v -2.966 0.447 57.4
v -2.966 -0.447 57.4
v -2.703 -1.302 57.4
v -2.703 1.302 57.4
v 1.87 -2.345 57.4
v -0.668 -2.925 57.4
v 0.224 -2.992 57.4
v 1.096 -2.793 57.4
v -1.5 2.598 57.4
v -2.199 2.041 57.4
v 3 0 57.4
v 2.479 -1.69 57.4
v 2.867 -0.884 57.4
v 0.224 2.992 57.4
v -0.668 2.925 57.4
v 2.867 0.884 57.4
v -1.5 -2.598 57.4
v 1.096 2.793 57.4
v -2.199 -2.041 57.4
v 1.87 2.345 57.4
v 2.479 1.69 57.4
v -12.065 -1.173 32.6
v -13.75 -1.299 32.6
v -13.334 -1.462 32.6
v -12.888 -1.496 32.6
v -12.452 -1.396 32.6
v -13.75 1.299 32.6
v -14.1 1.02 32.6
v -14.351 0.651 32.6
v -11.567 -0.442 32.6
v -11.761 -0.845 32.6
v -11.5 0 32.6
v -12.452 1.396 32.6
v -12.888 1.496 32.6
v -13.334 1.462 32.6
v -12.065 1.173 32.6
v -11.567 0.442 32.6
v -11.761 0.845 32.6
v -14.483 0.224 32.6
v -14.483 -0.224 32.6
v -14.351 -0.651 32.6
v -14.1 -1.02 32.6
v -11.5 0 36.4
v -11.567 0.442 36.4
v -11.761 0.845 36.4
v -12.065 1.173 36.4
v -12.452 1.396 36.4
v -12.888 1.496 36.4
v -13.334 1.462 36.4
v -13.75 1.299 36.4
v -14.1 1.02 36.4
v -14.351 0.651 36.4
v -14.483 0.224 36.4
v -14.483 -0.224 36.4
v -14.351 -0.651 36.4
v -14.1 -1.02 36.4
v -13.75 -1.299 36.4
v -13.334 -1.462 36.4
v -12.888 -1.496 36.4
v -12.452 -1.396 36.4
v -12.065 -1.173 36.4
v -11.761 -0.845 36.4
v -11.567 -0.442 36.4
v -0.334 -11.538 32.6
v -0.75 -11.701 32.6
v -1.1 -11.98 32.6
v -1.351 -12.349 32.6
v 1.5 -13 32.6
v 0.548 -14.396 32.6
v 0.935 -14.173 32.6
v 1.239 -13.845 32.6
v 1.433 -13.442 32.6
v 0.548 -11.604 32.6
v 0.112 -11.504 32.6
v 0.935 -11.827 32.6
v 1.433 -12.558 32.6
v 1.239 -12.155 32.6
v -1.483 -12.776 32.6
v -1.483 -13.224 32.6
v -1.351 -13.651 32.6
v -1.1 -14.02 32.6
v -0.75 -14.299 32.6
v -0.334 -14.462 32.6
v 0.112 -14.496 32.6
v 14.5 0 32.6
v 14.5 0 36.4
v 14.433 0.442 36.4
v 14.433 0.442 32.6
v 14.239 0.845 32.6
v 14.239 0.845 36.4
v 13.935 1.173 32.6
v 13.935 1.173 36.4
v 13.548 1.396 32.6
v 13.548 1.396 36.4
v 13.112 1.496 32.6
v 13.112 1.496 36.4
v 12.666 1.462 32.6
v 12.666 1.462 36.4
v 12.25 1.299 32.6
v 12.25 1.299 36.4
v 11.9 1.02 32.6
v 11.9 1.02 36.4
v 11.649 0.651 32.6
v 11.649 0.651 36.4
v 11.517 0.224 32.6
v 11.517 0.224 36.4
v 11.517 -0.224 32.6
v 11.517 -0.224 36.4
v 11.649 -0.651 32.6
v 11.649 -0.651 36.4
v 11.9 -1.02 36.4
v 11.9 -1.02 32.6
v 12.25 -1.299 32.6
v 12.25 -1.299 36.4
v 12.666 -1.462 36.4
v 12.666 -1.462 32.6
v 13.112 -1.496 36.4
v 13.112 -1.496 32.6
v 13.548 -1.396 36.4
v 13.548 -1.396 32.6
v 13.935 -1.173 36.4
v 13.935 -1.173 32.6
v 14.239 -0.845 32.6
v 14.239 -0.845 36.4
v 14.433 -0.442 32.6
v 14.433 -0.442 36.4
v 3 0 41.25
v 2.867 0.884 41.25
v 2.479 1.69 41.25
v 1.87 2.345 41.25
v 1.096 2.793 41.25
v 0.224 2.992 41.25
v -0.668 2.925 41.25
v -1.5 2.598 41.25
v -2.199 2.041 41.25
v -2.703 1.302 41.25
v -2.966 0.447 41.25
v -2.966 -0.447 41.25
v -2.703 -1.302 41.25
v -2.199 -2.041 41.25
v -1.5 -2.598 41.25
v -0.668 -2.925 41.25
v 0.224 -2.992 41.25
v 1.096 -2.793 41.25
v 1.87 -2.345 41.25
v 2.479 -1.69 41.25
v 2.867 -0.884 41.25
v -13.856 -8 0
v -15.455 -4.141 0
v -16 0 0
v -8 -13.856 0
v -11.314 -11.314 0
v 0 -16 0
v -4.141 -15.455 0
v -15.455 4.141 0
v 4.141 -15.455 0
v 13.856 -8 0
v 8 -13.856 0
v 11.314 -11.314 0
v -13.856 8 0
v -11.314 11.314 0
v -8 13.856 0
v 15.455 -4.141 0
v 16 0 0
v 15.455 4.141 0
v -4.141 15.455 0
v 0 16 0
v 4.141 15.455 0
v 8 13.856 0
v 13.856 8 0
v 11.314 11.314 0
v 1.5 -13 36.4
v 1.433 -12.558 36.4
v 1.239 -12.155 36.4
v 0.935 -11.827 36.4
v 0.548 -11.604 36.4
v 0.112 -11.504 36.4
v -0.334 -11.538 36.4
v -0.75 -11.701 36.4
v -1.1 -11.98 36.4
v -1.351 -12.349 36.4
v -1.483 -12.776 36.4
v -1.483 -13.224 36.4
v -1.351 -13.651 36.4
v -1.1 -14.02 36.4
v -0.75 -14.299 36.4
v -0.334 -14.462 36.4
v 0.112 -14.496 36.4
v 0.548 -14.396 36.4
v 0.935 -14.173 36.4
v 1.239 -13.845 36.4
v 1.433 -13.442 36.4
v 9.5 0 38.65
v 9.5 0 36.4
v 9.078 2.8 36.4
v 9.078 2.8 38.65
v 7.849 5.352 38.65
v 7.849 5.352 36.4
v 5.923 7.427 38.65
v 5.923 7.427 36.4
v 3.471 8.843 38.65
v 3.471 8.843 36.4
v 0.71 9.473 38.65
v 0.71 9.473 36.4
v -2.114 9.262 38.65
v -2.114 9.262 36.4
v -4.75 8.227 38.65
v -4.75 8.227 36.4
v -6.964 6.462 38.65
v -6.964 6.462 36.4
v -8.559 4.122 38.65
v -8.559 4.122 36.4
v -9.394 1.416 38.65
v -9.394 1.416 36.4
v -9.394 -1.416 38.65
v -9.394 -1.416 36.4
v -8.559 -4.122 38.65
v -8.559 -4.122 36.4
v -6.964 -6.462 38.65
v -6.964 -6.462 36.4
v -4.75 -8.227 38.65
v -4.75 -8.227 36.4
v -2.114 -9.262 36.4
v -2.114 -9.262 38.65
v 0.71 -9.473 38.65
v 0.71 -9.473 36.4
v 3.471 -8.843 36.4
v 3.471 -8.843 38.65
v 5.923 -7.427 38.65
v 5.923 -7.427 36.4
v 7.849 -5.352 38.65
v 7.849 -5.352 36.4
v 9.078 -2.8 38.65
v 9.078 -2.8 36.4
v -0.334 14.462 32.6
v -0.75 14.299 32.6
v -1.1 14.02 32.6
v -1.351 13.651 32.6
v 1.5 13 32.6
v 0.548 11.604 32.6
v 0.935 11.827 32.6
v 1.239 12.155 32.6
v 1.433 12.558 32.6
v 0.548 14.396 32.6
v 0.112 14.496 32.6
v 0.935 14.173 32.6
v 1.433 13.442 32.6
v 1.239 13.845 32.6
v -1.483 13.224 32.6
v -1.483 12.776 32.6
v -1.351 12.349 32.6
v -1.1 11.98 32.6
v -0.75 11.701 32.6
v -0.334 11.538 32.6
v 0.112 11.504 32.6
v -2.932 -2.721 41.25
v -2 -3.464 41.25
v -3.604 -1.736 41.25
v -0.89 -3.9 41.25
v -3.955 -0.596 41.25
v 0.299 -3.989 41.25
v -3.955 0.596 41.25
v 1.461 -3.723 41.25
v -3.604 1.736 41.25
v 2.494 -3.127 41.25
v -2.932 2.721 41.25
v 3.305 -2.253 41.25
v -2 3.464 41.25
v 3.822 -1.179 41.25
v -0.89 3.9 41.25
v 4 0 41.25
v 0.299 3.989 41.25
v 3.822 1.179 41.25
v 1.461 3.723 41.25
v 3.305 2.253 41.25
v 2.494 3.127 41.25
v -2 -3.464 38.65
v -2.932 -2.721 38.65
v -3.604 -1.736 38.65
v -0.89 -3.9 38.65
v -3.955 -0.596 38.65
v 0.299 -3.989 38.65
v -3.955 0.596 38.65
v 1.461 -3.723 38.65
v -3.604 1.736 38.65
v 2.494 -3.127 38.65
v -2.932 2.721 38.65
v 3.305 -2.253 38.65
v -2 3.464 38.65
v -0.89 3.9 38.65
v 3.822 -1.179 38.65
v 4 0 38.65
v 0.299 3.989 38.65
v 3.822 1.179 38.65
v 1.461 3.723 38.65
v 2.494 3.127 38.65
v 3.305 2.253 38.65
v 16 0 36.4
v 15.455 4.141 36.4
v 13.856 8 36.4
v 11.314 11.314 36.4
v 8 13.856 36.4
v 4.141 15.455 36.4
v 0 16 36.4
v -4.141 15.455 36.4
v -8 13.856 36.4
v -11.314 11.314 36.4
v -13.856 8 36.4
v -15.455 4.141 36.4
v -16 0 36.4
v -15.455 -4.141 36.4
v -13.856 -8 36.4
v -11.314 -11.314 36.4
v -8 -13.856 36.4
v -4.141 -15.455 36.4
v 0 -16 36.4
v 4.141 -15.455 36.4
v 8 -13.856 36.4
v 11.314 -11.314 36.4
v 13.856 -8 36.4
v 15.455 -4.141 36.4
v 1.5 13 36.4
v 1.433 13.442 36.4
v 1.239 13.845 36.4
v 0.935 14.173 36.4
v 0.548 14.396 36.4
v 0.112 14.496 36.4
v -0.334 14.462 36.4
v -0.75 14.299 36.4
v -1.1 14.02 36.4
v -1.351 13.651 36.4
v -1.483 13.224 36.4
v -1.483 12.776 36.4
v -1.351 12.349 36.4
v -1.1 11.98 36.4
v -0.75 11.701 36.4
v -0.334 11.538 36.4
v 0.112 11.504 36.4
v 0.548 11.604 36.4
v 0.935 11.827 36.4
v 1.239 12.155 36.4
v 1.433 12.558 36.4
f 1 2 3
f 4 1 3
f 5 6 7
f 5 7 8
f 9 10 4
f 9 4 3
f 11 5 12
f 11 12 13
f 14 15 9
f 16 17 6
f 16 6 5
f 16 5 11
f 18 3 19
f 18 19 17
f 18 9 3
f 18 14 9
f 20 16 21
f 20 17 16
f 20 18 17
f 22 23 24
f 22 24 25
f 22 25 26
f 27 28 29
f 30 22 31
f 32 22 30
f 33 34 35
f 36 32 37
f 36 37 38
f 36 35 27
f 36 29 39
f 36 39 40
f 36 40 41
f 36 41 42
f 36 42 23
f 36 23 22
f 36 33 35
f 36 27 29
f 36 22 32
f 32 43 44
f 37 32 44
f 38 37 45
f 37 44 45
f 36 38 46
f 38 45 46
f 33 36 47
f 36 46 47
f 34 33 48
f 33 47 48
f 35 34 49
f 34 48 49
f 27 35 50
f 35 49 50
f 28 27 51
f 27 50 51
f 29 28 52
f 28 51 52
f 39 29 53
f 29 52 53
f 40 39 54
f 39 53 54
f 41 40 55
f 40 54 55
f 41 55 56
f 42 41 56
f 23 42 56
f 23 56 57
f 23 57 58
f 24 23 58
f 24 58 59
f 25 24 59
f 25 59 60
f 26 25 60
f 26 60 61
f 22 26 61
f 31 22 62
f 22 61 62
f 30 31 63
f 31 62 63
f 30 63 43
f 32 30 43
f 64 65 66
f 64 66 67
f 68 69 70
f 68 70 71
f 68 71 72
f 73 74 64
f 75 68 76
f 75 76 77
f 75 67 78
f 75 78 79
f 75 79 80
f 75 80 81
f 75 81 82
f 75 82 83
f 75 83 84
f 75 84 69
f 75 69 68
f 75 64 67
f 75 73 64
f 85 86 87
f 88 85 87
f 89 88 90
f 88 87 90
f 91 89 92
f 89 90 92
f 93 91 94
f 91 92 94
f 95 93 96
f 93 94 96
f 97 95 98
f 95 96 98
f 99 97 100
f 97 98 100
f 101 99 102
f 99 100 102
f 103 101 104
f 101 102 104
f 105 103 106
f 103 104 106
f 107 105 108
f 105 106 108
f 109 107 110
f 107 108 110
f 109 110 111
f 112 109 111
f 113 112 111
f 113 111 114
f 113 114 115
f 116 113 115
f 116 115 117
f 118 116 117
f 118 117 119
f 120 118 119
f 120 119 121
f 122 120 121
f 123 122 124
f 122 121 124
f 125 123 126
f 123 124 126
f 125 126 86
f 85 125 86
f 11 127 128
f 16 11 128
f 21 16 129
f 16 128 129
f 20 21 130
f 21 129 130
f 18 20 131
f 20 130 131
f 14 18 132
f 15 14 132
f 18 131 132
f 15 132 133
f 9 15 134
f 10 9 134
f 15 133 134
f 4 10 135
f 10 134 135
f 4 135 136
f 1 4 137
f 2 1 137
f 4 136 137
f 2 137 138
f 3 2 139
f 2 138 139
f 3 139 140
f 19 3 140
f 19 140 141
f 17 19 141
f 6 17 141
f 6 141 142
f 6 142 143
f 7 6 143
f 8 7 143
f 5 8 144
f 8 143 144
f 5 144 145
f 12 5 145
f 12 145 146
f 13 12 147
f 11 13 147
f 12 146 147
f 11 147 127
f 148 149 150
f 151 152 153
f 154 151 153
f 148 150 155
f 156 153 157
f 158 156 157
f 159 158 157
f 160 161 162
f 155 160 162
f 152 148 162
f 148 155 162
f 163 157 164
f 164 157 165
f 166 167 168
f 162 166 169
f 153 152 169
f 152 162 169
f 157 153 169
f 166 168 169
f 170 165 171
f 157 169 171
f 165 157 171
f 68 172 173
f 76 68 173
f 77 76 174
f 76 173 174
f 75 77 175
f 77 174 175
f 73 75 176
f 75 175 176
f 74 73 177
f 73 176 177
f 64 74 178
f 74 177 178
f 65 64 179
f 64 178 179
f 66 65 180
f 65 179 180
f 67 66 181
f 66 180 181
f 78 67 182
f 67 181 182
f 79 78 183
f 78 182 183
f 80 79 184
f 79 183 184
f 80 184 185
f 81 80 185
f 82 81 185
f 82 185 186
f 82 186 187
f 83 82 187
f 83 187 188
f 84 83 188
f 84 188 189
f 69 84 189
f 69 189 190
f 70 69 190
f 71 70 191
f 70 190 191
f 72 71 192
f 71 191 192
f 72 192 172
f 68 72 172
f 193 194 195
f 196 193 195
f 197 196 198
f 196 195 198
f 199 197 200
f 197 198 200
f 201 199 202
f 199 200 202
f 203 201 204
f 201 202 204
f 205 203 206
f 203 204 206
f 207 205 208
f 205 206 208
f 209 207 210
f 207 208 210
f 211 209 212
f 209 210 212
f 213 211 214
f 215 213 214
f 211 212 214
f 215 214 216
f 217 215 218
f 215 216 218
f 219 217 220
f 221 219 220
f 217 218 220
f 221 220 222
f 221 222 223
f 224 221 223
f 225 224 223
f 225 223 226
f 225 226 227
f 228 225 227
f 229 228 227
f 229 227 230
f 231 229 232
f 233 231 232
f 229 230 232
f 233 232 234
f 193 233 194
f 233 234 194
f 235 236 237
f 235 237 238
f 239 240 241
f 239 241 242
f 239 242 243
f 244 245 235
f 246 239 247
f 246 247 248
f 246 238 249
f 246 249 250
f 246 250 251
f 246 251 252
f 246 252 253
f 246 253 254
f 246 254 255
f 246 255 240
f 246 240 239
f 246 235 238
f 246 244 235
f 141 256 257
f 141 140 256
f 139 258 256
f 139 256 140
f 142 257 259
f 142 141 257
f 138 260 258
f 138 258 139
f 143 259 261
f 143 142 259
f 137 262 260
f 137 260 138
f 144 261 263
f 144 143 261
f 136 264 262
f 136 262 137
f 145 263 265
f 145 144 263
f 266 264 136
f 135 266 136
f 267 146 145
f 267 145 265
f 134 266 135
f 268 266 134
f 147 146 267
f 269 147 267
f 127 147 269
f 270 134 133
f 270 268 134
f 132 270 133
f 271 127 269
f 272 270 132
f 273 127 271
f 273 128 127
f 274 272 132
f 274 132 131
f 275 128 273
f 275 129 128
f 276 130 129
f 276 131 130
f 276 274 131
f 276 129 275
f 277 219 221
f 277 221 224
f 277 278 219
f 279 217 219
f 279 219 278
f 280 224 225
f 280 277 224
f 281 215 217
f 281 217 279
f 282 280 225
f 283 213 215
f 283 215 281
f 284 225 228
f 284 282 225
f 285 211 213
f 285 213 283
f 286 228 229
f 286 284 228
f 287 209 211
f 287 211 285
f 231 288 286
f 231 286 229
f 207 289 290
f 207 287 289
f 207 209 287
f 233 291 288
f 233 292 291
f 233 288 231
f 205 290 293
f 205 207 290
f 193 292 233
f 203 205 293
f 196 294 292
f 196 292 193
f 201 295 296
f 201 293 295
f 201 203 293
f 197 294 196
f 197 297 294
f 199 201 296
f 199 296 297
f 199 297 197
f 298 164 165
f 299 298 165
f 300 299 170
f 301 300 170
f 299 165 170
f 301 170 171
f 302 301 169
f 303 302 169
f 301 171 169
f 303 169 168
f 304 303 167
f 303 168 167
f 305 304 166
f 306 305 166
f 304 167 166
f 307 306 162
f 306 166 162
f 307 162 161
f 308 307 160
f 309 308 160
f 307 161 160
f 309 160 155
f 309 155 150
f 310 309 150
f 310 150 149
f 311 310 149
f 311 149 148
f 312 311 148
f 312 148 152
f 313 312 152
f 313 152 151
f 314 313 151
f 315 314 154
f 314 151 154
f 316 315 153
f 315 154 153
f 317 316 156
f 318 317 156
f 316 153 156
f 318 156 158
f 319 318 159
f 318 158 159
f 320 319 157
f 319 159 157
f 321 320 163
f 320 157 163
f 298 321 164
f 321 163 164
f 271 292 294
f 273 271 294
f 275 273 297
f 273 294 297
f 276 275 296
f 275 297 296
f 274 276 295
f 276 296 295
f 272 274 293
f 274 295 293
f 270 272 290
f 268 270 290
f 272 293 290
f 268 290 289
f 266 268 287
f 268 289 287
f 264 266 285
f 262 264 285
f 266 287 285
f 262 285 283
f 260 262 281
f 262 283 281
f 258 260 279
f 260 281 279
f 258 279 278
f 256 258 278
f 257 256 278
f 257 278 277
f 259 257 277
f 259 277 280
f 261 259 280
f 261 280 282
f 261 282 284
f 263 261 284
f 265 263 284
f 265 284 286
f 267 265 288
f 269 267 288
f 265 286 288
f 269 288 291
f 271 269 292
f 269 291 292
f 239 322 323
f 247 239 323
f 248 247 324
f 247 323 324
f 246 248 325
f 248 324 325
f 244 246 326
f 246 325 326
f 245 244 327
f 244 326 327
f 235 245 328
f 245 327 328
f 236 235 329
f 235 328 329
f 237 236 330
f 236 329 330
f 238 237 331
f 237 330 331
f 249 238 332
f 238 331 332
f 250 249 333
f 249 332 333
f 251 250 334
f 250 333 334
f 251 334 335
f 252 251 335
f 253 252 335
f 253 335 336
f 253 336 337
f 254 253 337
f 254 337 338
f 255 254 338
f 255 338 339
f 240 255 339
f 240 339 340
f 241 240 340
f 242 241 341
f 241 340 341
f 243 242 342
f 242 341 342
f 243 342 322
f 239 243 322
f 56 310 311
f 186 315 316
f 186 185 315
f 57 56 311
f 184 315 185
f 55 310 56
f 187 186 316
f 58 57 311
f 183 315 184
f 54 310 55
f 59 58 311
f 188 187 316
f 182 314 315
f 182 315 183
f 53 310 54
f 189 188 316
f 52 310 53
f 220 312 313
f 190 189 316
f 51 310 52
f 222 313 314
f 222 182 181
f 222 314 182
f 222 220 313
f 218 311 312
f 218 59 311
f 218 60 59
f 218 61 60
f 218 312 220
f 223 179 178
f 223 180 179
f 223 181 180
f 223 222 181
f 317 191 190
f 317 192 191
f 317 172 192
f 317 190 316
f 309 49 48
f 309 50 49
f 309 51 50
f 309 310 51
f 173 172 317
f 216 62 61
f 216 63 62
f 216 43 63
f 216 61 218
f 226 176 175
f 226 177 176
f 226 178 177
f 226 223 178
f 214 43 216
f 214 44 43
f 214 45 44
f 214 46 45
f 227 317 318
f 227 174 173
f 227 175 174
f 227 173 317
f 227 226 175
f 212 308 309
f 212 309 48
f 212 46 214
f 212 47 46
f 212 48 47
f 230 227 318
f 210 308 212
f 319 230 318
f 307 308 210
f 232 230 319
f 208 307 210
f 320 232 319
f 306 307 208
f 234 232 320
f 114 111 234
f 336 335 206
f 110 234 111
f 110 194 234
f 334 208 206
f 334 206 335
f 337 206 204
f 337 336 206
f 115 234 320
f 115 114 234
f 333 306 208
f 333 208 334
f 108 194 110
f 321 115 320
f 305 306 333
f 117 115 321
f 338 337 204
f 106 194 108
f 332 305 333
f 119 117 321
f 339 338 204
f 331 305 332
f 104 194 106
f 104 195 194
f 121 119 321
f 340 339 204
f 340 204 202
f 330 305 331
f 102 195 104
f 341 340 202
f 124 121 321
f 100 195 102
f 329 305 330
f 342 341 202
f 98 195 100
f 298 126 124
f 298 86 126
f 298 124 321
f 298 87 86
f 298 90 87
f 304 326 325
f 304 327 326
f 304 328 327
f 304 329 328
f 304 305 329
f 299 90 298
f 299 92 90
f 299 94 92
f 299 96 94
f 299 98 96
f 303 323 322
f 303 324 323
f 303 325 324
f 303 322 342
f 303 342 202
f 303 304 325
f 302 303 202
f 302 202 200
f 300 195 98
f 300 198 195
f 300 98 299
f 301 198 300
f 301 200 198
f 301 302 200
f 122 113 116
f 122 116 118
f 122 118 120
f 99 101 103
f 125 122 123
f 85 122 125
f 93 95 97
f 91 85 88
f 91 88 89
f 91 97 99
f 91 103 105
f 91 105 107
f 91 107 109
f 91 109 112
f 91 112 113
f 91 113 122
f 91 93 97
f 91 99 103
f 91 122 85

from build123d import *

# Parameters (mm, degrees)
ESQUISSE1_R             = 16
BOSS_EXTRU_1_DEPTH      = 36.4
ESQUISSE2_R             = 9.5
BOSS_EXTRU_2_DEPTH      = 2.25
ESQUISSE3_R             = 4
BOSS_EXTRU_3_DEPTH      = 2.6
ESQUISSE4_R             = 3
BOSS_EXTRU_4_DEPTH      = 16.15
ESQUISSE5_R             = 1.5
ENL_V_MAT_EXTRU_1_DEPTH = 3.8


with BuildPart() as part:
    # Esquisse1 → Boss.-Extru.1 (new body)
    with BuildSketch(Plane.XY):
        Circle(ESQUISSE1_R)
    extrude(amount=BOSS_EXTRU_1_DEPTH)

    # Esquisse2 → Boss.-Extru.2 (add)
    with BuildSketch(Plane.XY.offset(36.4)):
        Circle(ESQUISSE2_R)
    extrude(amount=BOSS_EXTRU_2_DEPTH)

    # Esquisse3 → Boss.-Extru.3 (add)
    with BuildSketch(Plane.XY.offset(38.65)):
        Circle(ESQUISSE3_R)
    extrude(amount=BOSS_EXTRU_3_DEPTH)

    # Esquisse4 → Boss.-Extru.4 (add)
    with BuildSketch(Plane.XY.offset(41.25)):
        Circle(ESQUISSE4_R)
    extrude(amount=BOSS_EXTRU_4_DEPTH)

    # Esquisse5 → Enlèv. mat.-Extru.1 (cut)
    with BuildSketch(Plane.XY.offset(36.4)):
        with Locations((0, 13)):
            Circle(ESQUISSE5_R)
        with Locations((13, 0)):
            Circle(ESQUISSE5_R)
        with Locations((0, -13)):
            Circle(ESQUISSE5_R)
        with Locations((-13, 0)):
            Circle(ESQUISSE5_R)
    extrude(amount=-ENL_V_MAT_EXTRU_1_DEPTH, mode=Mode.SUBTRACT)


solid = part.part
